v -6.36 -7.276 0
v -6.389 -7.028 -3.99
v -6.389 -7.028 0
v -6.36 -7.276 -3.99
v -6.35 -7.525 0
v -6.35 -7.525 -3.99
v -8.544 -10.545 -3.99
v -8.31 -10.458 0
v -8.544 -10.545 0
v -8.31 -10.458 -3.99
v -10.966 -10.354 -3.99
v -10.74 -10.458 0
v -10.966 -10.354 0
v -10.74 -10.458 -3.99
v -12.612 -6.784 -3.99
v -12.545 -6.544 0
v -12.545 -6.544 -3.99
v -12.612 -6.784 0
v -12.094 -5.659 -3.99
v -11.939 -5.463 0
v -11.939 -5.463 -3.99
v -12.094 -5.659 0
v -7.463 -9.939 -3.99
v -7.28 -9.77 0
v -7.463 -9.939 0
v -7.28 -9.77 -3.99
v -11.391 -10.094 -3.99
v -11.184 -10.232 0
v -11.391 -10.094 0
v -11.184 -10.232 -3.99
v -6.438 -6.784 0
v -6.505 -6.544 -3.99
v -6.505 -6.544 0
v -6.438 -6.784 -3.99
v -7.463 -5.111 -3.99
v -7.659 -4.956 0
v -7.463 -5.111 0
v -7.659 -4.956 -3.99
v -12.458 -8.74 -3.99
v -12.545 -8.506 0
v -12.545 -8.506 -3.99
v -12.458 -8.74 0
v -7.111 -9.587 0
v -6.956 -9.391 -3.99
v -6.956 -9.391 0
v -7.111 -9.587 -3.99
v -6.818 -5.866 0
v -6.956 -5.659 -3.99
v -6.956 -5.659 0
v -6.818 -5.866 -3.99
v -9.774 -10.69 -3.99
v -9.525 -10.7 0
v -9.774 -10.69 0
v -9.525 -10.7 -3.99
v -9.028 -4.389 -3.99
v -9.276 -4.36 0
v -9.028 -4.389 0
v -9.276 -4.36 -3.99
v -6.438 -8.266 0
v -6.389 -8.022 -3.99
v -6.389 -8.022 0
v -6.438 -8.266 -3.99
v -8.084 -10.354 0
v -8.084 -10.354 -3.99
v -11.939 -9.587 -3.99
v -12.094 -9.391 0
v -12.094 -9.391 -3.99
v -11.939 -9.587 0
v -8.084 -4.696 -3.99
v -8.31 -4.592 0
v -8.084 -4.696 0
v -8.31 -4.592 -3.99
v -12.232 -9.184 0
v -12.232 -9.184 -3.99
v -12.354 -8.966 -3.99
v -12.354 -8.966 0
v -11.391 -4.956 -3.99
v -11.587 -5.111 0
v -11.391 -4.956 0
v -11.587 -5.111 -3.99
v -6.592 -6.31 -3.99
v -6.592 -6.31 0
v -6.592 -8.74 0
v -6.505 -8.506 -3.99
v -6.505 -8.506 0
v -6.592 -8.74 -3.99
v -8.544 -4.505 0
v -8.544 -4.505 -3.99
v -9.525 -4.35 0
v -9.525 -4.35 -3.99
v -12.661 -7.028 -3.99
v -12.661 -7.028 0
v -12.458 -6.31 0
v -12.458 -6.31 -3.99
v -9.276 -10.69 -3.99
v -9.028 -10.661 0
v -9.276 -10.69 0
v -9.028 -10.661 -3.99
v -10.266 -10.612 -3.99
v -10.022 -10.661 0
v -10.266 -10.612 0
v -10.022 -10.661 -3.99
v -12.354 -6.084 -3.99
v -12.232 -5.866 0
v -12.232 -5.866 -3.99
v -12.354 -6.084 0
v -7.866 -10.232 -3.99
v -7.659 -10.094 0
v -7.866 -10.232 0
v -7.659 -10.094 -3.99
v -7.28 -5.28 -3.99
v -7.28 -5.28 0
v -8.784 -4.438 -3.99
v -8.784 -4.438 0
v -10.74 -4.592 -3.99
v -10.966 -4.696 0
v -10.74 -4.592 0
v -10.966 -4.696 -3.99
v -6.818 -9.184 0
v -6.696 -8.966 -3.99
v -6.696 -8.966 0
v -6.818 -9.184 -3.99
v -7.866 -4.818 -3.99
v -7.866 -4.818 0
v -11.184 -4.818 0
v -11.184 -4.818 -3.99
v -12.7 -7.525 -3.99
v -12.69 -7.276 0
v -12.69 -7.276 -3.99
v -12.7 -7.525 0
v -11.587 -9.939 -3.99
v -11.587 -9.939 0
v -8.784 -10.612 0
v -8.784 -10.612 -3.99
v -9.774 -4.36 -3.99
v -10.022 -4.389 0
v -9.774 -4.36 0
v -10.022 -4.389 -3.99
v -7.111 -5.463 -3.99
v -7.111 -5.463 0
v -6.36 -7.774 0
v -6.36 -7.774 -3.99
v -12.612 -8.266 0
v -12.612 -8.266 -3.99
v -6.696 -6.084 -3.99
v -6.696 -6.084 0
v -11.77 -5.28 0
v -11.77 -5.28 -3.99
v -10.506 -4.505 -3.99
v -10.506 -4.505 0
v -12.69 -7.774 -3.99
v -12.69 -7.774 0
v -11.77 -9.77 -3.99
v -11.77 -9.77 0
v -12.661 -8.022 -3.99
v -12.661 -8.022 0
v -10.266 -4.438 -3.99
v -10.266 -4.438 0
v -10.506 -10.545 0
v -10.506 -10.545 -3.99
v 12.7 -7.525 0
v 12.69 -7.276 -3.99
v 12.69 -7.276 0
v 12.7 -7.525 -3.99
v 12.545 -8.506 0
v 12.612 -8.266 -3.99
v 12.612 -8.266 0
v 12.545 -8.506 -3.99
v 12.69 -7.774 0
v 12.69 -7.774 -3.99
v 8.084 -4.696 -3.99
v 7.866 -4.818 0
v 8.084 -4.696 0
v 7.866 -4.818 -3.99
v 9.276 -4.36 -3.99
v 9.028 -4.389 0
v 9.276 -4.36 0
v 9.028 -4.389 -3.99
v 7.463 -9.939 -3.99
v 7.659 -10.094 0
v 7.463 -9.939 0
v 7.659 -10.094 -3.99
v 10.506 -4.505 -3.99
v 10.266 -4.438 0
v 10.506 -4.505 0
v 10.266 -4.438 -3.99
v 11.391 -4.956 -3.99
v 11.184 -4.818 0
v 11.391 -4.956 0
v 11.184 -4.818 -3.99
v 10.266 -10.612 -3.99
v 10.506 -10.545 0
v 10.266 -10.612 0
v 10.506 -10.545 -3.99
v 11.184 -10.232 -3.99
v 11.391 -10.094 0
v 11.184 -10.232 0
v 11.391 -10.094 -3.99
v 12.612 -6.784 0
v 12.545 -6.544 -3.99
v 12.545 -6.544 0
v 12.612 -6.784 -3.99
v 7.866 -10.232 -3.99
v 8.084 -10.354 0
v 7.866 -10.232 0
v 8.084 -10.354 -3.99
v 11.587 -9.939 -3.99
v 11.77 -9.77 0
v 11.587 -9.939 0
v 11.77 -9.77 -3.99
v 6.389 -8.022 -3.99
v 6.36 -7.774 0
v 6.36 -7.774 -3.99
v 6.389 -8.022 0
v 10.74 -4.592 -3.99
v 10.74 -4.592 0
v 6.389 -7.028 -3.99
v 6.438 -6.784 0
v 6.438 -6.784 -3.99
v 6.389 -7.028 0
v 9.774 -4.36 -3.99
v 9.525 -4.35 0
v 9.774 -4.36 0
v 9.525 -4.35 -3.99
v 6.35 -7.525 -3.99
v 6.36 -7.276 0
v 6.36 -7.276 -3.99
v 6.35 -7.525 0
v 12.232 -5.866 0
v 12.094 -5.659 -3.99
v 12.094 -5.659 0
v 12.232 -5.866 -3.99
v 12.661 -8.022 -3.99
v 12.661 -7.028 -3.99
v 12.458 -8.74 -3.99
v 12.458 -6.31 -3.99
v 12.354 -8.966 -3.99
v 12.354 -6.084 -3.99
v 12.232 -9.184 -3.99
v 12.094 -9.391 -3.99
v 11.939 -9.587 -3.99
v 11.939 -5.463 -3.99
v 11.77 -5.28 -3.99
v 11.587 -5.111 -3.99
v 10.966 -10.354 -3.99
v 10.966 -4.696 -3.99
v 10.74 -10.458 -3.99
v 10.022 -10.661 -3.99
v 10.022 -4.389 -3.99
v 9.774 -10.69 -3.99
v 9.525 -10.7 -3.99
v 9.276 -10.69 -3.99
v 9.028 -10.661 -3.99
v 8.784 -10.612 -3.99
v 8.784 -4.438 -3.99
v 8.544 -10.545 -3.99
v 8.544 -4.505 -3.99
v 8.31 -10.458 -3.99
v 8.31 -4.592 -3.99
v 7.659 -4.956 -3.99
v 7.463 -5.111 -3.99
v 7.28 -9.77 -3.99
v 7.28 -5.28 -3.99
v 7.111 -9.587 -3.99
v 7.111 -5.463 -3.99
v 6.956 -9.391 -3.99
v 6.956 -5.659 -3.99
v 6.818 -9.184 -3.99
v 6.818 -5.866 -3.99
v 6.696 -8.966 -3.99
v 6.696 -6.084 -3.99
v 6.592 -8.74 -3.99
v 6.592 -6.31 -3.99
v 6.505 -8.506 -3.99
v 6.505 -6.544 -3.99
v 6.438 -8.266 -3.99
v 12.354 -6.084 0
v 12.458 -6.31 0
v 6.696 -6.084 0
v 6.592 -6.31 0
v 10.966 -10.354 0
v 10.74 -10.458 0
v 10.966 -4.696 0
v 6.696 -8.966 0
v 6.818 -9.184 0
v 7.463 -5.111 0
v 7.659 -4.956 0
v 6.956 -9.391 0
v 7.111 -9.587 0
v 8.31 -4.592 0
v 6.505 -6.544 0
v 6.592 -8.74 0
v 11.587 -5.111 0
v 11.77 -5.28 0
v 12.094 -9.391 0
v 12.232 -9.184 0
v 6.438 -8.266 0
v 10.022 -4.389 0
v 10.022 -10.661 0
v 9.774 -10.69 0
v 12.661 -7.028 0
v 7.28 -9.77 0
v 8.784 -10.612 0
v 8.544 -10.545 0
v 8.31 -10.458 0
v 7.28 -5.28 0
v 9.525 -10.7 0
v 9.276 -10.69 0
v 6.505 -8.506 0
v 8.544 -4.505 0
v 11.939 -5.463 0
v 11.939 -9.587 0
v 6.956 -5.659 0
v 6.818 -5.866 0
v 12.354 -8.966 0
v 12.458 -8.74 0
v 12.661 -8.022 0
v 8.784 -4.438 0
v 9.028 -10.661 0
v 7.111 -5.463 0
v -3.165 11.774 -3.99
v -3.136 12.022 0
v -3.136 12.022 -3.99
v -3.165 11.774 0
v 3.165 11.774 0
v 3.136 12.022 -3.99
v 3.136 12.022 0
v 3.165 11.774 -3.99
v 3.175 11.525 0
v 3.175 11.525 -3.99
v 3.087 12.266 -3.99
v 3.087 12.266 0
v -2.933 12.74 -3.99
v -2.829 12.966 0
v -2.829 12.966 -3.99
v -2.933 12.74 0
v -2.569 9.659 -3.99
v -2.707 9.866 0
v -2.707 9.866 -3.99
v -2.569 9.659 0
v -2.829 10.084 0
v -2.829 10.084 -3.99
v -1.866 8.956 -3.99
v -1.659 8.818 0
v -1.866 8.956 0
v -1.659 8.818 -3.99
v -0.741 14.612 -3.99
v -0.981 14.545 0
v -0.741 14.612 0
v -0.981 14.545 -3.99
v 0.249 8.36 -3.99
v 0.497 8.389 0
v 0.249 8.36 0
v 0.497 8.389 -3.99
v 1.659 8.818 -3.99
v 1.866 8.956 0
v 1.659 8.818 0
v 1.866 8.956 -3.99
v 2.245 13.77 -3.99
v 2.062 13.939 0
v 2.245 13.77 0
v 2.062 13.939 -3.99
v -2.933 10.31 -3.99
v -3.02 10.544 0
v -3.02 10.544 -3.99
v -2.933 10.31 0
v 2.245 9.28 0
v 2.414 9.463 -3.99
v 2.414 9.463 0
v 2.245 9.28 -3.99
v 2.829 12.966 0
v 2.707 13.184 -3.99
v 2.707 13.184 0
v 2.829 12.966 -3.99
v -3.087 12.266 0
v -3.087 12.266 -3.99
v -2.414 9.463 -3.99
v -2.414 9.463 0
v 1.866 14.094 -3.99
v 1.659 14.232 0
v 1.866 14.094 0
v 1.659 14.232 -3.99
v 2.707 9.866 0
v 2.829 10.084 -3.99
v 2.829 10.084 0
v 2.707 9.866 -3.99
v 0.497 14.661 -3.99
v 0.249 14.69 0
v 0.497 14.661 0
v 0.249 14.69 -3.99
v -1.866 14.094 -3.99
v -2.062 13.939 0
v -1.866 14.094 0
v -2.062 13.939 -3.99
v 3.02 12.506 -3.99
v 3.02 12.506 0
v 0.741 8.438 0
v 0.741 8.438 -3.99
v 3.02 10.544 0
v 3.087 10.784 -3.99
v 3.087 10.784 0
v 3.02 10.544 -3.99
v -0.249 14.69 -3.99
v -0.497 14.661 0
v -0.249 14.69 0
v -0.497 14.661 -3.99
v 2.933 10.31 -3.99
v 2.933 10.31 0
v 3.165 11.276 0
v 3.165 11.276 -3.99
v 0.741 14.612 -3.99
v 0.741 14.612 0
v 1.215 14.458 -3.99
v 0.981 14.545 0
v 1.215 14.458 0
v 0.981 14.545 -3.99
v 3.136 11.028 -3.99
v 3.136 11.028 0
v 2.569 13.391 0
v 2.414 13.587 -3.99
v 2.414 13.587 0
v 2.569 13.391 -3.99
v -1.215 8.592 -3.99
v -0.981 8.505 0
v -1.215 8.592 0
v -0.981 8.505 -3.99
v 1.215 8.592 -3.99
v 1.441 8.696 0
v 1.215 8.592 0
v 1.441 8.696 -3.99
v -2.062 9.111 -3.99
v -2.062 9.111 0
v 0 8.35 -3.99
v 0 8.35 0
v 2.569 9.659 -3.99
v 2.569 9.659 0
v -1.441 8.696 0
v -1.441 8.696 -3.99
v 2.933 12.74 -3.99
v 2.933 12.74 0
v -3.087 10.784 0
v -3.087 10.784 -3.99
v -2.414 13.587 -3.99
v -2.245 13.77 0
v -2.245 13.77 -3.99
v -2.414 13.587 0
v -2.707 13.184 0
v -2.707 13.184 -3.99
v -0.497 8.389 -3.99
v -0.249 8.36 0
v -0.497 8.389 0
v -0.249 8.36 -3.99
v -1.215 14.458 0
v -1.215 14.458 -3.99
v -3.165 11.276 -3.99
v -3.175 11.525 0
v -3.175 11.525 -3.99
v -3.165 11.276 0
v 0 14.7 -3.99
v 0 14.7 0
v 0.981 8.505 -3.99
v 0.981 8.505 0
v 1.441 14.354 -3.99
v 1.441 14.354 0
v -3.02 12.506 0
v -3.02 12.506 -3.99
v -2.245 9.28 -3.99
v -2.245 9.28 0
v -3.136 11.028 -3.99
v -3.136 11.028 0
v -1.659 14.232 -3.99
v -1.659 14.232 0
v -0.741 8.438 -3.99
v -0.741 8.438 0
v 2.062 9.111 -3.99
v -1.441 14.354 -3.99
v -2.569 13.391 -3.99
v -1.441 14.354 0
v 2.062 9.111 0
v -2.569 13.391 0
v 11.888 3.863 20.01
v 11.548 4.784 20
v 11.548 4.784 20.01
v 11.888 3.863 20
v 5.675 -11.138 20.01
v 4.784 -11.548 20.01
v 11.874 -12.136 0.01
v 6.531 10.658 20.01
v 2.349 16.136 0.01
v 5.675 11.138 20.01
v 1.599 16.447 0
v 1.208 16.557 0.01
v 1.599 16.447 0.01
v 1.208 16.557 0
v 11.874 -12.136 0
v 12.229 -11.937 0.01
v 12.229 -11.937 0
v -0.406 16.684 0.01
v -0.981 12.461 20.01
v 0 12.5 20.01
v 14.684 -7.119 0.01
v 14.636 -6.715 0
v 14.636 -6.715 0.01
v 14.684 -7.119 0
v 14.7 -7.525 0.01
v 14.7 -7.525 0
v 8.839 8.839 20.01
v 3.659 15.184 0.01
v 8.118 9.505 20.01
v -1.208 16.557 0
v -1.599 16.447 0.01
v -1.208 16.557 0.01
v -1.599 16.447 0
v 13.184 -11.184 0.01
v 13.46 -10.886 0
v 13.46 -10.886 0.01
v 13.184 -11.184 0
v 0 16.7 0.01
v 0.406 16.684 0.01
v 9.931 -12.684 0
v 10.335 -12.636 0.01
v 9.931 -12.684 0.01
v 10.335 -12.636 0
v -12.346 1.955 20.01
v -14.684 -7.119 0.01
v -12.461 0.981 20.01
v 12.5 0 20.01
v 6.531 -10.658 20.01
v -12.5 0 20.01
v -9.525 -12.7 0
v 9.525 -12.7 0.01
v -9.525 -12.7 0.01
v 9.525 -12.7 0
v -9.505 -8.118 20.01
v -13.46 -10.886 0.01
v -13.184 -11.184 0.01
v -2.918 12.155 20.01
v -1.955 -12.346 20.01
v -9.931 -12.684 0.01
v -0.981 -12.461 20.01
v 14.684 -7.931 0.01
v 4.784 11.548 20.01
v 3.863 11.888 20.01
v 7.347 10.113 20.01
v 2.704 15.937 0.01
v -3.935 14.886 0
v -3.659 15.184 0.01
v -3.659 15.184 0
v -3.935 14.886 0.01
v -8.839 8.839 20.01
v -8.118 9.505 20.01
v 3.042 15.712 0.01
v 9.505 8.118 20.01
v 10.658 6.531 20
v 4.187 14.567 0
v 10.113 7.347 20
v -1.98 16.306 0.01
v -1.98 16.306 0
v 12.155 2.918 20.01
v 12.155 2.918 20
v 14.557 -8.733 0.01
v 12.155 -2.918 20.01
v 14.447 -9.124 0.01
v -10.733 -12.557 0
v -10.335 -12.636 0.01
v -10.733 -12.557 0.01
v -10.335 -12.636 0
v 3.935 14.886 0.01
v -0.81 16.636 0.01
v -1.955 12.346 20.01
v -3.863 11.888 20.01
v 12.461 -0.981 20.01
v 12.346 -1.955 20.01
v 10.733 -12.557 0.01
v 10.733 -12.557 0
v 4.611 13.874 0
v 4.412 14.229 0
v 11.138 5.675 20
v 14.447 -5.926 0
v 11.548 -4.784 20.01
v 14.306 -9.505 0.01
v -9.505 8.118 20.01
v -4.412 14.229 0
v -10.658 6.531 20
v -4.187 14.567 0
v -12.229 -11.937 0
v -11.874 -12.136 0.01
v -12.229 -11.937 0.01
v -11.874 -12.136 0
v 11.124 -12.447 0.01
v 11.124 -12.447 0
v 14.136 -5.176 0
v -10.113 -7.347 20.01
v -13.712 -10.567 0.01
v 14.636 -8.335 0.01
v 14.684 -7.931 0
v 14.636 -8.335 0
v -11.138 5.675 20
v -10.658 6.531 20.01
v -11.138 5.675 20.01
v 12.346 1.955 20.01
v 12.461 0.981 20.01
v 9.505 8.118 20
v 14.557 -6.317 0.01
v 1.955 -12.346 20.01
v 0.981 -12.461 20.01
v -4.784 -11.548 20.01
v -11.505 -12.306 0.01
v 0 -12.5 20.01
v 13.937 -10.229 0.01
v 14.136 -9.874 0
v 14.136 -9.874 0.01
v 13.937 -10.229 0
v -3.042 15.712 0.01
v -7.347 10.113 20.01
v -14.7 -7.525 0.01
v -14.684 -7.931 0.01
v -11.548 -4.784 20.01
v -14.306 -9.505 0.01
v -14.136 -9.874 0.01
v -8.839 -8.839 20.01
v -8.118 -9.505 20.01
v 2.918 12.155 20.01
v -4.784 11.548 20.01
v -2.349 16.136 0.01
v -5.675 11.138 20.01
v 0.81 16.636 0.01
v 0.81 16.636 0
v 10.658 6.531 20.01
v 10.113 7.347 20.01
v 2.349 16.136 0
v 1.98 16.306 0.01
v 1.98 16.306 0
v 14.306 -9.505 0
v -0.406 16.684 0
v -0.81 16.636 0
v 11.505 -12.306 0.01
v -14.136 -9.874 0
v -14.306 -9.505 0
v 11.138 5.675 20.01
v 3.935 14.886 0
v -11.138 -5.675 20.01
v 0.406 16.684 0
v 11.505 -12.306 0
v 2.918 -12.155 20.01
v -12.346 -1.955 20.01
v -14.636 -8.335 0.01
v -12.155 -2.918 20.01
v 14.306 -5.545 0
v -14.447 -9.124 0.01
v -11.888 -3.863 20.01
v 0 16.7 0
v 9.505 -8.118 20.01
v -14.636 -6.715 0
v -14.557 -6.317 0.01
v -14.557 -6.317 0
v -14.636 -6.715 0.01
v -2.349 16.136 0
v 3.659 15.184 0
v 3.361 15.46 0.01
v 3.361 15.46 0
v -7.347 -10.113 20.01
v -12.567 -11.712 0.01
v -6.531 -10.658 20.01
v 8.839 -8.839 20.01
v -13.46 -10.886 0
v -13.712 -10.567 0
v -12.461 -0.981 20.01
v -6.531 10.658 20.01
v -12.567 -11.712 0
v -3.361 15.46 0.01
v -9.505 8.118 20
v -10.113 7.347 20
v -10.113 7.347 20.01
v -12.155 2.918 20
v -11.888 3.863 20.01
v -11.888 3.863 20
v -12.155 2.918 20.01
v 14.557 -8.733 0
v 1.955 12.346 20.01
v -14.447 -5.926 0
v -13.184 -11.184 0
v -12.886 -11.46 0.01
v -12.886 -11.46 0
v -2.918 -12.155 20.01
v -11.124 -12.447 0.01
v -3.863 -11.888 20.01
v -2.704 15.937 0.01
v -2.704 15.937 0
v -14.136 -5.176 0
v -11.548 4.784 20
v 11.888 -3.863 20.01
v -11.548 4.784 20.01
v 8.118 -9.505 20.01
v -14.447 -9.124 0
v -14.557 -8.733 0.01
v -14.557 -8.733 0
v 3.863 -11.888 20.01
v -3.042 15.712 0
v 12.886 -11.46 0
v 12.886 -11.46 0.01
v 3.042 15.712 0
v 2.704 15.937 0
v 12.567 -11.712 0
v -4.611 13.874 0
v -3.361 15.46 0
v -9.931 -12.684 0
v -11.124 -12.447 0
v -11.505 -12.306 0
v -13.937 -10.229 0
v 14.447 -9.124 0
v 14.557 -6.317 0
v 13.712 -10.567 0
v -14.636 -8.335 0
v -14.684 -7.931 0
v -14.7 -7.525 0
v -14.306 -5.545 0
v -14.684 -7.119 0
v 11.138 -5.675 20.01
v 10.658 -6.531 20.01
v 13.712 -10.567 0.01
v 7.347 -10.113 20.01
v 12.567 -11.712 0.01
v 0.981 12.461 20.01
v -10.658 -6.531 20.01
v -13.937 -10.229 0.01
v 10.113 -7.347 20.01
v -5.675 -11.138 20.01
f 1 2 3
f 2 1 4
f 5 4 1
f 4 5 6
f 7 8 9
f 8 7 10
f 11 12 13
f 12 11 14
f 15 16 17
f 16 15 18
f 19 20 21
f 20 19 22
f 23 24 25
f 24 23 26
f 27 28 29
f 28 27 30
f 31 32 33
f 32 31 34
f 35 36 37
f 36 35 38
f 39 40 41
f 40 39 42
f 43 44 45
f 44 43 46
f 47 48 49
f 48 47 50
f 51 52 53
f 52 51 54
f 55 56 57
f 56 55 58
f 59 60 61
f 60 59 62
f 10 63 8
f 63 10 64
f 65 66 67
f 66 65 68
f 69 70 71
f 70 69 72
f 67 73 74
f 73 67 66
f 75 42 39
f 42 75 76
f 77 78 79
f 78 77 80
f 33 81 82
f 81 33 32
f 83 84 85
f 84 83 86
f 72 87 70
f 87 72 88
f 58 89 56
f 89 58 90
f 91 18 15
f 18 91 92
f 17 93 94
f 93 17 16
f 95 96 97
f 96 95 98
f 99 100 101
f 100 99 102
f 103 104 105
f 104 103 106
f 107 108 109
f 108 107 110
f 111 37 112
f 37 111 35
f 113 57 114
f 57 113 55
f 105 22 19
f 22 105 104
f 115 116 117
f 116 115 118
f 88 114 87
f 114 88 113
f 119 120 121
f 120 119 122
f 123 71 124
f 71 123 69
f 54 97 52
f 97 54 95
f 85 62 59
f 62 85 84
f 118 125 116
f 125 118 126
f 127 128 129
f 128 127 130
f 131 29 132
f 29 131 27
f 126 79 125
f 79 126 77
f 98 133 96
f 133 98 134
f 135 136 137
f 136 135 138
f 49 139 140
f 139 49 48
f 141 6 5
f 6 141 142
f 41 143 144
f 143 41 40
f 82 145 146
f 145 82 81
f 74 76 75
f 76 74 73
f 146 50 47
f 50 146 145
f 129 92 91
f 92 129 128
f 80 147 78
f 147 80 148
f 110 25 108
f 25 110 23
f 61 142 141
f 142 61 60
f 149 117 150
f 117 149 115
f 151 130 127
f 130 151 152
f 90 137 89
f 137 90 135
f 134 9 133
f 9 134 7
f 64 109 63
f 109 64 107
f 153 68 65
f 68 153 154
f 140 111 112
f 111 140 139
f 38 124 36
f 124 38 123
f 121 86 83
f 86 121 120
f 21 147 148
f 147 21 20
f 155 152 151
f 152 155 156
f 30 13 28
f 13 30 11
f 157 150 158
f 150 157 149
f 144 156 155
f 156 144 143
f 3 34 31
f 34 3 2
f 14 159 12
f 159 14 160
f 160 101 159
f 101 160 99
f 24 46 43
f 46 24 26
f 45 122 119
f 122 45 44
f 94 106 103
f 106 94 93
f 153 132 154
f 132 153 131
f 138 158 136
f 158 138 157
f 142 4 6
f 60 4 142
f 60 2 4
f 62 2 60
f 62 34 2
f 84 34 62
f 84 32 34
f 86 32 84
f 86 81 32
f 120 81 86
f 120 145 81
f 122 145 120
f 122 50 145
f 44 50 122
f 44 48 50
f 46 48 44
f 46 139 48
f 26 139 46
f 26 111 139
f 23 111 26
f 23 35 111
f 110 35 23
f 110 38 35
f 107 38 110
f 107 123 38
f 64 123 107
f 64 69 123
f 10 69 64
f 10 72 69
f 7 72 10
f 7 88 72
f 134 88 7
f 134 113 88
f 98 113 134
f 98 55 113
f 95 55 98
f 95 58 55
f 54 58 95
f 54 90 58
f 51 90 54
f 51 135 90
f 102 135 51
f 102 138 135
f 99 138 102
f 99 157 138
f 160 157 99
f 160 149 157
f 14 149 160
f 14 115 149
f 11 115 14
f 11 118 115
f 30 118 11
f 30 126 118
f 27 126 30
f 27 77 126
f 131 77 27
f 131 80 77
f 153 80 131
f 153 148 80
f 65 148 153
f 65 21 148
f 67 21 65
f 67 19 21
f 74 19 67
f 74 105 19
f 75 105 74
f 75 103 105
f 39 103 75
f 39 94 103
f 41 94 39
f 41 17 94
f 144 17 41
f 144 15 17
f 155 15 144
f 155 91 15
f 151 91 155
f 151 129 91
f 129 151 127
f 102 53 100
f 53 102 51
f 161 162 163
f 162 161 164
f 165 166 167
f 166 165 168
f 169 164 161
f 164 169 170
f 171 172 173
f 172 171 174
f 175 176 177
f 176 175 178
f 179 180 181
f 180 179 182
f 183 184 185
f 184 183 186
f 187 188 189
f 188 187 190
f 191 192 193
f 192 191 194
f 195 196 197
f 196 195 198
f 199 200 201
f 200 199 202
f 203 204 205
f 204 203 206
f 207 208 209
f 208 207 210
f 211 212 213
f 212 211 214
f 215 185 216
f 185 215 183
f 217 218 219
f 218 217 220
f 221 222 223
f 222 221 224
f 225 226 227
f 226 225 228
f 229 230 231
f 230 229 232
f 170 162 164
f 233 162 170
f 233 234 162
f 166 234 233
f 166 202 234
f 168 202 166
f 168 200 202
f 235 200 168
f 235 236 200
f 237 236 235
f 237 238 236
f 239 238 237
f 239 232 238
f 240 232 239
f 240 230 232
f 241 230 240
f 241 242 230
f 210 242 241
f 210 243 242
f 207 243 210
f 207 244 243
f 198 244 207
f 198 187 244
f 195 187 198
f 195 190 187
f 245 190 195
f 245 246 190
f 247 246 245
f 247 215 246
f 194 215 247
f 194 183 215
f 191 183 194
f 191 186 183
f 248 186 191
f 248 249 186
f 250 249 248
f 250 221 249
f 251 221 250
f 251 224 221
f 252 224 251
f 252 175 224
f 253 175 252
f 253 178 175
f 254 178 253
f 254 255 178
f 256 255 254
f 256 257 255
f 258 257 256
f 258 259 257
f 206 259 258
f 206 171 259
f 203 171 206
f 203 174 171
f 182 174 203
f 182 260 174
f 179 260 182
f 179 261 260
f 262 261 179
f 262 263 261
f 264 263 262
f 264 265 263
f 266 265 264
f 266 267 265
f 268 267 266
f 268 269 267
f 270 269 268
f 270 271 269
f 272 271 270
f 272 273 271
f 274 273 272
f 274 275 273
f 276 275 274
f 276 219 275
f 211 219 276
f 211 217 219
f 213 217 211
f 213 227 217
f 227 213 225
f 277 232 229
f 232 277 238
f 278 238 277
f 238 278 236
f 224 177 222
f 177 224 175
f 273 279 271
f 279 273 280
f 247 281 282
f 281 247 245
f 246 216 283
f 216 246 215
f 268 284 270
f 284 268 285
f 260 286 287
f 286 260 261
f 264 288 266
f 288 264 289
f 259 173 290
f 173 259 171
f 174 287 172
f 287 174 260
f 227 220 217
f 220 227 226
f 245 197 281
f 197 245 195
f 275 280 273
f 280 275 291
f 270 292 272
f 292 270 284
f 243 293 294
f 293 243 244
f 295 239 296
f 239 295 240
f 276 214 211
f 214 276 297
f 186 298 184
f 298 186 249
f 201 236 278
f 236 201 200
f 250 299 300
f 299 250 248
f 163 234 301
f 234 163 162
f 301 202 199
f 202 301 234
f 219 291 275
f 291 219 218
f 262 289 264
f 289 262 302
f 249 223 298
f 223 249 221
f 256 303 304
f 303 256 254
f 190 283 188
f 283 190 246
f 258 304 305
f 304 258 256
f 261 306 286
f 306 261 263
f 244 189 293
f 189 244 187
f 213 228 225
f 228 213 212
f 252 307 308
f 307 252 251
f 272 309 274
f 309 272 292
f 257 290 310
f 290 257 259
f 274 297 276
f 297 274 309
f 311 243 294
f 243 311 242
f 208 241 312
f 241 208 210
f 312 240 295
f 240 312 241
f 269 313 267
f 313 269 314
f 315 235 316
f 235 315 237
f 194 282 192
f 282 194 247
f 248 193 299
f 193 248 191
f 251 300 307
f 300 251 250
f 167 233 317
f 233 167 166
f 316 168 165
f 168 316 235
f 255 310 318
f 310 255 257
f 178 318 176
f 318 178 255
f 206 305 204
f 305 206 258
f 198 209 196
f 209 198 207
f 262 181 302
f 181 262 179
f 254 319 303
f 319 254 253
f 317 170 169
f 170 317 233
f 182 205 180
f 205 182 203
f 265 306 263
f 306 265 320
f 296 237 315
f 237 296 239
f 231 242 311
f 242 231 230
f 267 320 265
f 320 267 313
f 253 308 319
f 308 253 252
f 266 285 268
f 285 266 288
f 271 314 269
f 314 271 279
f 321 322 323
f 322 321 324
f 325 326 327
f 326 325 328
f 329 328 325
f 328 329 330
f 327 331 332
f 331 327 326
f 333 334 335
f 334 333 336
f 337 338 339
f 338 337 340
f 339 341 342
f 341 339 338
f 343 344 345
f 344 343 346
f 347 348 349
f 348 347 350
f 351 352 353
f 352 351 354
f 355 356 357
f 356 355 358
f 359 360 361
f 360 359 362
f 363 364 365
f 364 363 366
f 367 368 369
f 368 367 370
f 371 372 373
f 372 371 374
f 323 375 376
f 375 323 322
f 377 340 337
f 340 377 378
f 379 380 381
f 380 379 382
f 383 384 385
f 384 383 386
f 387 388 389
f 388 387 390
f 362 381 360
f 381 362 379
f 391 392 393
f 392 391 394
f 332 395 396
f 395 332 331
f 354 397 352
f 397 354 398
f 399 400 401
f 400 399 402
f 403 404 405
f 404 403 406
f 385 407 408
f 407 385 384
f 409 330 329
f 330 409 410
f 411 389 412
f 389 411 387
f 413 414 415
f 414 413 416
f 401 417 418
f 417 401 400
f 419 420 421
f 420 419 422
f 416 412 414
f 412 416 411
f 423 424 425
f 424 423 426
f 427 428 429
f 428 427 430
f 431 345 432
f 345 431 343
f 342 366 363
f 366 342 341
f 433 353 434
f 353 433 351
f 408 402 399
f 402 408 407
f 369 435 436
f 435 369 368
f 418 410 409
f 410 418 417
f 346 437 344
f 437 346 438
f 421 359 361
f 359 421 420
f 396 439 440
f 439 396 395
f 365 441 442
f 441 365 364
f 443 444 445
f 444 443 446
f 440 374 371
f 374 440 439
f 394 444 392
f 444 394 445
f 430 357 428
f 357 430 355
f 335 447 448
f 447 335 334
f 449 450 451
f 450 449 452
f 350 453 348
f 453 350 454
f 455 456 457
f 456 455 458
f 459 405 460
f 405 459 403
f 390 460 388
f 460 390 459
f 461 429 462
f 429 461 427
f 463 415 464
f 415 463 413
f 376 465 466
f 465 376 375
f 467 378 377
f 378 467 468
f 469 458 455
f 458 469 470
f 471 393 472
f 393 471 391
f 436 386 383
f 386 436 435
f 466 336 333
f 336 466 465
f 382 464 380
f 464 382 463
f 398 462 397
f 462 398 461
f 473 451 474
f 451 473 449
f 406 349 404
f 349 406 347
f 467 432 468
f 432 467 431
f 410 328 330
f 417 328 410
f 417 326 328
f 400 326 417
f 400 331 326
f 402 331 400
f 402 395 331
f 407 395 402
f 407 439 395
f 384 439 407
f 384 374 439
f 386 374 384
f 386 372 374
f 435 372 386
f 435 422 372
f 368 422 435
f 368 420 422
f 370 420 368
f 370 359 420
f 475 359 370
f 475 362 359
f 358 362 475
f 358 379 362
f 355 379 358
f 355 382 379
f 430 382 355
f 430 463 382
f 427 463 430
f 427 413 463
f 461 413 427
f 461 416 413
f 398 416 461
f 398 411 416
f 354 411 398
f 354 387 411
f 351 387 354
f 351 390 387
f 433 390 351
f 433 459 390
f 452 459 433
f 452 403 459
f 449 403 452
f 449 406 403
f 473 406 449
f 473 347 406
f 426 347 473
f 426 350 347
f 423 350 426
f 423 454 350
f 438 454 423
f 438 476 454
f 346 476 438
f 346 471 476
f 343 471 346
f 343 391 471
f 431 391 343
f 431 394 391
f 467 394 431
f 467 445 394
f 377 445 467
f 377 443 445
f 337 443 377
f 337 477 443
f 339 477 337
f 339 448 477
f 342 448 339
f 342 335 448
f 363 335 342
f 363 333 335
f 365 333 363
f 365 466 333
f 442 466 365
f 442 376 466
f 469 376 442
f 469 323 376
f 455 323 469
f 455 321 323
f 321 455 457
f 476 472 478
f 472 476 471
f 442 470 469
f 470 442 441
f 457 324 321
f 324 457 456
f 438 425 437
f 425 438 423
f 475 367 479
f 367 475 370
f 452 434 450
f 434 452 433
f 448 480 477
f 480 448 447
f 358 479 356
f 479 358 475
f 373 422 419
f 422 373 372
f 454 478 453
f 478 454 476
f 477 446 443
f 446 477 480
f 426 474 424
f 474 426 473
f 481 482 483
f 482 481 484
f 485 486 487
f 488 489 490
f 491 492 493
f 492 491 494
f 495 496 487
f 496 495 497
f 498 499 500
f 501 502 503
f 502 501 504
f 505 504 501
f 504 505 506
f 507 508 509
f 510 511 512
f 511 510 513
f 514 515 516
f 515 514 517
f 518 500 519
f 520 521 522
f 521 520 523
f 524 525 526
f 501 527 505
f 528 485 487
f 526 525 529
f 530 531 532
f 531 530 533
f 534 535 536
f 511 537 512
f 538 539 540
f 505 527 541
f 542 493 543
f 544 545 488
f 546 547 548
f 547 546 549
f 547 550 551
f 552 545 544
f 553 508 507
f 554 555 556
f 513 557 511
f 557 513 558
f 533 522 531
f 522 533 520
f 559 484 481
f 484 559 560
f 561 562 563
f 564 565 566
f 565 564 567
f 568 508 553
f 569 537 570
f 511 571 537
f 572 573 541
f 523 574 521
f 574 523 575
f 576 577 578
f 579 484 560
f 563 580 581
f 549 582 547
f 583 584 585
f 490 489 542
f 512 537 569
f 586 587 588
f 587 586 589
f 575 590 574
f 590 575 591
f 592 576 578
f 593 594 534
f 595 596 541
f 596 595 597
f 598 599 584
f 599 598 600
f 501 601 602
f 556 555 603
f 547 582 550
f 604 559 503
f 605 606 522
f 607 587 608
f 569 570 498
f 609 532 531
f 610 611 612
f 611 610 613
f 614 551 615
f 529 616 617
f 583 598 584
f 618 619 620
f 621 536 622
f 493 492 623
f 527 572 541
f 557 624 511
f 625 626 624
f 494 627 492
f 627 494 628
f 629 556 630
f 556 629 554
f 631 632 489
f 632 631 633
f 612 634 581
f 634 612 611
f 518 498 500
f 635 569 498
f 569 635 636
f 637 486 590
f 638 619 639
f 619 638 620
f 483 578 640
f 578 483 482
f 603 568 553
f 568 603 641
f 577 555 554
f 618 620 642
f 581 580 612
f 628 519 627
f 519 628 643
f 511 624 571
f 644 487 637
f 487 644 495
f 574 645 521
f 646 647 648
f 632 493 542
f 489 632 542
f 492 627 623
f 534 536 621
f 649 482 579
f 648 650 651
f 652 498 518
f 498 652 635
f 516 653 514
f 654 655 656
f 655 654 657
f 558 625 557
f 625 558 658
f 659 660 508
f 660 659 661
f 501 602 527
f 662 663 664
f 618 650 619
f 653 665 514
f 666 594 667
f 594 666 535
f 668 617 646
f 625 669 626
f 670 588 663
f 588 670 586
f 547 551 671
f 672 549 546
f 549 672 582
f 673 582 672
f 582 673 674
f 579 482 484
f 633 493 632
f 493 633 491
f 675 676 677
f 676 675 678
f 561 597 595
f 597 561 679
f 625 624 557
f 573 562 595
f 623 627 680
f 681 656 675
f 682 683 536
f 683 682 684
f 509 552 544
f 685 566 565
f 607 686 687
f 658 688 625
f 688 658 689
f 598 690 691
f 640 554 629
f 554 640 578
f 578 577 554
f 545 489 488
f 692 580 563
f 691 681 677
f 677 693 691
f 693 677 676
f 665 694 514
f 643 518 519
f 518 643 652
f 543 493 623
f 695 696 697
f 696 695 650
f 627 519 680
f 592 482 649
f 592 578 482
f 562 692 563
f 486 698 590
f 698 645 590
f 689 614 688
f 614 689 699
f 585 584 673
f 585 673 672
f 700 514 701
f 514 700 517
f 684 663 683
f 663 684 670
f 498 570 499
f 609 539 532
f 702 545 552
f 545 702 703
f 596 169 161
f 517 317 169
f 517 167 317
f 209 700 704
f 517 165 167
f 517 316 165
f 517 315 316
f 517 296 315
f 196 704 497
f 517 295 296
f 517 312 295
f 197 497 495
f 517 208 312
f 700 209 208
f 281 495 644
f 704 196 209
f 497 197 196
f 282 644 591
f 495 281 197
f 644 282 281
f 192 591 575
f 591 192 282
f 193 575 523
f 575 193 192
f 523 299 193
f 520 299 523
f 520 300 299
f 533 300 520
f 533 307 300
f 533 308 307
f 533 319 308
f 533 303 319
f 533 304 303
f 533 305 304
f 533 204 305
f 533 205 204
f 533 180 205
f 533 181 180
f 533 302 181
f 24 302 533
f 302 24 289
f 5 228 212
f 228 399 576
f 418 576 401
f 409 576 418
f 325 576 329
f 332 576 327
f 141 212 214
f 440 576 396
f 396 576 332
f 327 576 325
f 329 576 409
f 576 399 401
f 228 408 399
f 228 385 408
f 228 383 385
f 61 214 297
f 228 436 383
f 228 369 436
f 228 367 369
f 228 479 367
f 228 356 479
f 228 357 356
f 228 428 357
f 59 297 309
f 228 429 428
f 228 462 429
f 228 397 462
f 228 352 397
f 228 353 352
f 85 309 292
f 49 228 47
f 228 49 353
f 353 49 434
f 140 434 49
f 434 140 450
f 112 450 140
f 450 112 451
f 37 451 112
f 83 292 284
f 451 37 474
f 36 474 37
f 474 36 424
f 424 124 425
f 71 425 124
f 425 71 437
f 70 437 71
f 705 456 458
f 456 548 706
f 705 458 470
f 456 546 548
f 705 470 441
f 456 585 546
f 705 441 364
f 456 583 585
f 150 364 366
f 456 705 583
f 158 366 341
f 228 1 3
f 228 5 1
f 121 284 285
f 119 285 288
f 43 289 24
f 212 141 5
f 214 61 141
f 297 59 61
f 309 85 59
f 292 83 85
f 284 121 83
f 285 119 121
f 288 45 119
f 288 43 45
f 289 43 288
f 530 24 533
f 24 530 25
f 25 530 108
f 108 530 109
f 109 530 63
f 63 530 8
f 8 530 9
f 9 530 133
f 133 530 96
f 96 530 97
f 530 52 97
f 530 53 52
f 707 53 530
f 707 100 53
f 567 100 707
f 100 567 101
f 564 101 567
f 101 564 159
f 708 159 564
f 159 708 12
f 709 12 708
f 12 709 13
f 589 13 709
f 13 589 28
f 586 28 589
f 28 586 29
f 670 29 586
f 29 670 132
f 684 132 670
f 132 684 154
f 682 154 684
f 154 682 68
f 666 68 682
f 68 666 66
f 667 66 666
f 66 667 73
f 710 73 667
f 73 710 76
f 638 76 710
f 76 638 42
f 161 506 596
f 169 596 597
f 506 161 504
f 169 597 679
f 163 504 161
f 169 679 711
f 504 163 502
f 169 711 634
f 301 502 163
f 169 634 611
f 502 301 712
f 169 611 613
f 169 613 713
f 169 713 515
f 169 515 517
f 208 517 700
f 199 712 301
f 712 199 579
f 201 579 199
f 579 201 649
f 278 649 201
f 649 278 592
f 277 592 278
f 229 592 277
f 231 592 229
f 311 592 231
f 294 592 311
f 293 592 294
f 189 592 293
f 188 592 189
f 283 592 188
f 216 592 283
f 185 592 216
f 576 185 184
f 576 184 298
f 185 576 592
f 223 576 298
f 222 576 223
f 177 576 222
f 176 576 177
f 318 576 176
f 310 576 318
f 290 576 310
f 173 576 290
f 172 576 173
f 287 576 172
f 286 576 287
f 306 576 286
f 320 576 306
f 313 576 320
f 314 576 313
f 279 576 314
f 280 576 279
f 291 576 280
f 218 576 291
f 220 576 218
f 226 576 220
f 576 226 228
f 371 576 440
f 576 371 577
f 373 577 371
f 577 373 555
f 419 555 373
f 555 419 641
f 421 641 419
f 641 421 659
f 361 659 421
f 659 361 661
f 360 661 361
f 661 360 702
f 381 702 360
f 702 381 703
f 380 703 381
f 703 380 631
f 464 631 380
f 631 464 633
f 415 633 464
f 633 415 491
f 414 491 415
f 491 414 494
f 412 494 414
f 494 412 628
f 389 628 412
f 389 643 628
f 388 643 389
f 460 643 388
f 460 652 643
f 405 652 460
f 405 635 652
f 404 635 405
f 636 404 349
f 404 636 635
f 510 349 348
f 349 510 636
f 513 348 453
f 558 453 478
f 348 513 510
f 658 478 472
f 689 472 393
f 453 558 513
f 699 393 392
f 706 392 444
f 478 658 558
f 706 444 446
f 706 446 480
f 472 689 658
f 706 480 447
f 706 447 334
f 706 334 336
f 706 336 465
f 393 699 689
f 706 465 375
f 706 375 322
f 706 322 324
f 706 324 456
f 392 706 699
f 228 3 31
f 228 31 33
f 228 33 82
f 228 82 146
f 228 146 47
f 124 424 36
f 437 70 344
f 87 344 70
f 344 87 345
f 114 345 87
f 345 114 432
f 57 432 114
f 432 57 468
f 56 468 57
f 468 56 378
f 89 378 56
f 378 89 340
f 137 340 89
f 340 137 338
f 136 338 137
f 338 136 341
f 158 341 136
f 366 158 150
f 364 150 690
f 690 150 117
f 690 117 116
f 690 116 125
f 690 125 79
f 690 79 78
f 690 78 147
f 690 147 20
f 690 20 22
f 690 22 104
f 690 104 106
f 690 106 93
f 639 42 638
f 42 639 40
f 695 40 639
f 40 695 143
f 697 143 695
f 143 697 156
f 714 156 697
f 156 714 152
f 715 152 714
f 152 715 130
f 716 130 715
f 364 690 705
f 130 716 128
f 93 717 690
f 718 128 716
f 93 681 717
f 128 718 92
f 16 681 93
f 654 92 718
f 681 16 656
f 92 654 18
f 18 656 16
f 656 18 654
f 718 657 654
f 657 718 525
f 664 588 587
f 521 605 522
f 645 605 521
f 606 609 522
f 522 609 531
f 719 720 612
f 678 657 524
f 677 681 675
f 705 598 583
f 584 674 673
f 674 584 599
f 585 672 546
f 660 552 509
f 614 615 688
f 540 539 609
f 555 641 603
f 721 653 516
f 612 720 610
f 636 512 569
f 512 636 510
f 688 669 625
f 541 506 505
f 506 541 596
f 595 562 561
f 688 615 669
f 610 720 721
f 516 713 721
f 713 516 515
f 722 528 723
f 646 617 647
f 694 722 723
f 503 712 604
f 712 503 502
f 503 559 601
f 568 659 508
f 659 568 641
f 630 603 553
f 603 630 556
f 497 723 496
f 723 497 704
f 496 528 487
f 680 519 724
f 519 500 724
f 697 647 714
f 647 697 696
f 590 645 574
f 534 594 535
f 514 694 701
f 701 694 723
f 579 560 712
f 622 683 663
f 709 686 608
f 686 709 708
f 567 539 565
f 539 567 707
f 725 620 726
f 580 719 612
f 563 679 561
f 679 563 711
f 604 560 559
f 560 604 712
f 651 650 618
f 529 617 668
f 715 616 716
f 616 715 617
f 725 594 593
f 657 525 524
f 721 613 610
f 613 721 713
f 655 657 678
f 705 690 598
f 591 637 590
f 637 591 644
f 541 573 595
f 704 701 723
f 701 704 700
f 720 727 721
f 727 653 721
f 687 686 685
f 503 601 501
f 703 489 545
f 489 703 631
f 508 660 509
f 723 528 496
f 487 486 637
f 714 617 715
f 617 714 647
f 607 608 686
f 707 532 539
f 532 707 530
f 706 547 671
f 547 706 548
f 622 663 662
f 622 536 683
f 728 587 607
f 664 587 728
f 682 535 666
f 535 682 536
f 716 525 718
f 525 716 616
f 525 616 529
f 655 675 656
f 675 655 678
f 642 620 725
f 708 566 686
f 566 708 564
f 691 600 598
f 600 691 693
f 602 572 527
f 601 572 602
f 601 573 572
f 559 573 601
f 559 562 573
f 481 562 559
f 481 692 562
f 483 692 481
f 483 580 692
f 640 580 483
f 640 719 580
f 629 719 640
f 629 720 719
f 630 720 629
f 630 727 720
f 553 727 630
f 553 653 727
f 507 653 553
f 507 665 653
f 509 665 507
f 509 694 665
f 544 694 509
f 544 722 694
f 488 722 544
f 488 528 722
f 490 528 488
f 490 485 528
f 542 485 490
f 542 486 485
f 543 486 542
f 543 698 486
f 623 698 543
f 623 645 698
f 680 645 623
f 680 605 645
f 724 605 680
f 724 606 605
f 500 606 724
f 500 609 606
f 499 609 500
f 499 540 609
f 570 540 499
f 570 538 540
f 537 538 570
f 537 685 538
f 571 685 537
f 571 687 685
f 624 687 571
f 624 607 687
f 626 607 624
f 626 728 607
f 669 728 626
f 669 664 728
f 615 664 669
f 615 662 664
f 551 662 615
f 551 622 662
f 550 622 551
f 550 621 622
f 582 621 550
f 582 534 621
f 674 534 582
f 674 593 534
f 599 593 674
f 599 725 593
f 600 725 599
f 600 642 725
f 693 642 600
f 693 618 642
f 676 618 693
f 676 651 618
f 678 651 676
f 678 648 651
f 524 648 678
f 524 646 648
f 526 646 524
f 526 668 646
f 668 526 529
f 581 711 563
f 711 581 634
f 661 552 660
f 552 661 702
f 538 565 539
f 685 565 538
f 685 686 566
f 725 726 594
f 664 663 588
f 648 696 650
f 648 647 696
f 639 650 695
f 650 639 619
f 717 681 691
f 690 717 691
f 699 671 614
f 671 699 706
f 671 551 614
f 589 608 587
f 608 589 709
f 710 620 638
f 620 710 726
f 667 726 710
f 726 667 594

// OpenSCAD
$fn=80;
e=0.01;

// mount hole
hole_dist=25.4 * 0.75;
hole_dia=25.4/4;
bottom_foot_dia=25;
poke_deep=4;

height=146 - 126;

module mount_pins(r=hole_dia/2, h=poke_deep) {
  translate([0, 2, 0]) {
    translate([-hole_dist/2, -hole_dist/2, 0]) cylinder(r=r, h=h);
    translate([+hole_dist/2, -hole_dist/2, 0]) cylinder(r=r, h=h);
    translate([0, hole_dist/2, 0]) cylinder(r=r, h=h);
  }
}


hull() {
  mount_pins(r=hole_dia/2+2, h=e);
  translate([0, 0, height]) cylinder(r=bottom_foot_dia/2, h=e);
}
translate([0, 0, -poke_deep+e]) mount_pins();
